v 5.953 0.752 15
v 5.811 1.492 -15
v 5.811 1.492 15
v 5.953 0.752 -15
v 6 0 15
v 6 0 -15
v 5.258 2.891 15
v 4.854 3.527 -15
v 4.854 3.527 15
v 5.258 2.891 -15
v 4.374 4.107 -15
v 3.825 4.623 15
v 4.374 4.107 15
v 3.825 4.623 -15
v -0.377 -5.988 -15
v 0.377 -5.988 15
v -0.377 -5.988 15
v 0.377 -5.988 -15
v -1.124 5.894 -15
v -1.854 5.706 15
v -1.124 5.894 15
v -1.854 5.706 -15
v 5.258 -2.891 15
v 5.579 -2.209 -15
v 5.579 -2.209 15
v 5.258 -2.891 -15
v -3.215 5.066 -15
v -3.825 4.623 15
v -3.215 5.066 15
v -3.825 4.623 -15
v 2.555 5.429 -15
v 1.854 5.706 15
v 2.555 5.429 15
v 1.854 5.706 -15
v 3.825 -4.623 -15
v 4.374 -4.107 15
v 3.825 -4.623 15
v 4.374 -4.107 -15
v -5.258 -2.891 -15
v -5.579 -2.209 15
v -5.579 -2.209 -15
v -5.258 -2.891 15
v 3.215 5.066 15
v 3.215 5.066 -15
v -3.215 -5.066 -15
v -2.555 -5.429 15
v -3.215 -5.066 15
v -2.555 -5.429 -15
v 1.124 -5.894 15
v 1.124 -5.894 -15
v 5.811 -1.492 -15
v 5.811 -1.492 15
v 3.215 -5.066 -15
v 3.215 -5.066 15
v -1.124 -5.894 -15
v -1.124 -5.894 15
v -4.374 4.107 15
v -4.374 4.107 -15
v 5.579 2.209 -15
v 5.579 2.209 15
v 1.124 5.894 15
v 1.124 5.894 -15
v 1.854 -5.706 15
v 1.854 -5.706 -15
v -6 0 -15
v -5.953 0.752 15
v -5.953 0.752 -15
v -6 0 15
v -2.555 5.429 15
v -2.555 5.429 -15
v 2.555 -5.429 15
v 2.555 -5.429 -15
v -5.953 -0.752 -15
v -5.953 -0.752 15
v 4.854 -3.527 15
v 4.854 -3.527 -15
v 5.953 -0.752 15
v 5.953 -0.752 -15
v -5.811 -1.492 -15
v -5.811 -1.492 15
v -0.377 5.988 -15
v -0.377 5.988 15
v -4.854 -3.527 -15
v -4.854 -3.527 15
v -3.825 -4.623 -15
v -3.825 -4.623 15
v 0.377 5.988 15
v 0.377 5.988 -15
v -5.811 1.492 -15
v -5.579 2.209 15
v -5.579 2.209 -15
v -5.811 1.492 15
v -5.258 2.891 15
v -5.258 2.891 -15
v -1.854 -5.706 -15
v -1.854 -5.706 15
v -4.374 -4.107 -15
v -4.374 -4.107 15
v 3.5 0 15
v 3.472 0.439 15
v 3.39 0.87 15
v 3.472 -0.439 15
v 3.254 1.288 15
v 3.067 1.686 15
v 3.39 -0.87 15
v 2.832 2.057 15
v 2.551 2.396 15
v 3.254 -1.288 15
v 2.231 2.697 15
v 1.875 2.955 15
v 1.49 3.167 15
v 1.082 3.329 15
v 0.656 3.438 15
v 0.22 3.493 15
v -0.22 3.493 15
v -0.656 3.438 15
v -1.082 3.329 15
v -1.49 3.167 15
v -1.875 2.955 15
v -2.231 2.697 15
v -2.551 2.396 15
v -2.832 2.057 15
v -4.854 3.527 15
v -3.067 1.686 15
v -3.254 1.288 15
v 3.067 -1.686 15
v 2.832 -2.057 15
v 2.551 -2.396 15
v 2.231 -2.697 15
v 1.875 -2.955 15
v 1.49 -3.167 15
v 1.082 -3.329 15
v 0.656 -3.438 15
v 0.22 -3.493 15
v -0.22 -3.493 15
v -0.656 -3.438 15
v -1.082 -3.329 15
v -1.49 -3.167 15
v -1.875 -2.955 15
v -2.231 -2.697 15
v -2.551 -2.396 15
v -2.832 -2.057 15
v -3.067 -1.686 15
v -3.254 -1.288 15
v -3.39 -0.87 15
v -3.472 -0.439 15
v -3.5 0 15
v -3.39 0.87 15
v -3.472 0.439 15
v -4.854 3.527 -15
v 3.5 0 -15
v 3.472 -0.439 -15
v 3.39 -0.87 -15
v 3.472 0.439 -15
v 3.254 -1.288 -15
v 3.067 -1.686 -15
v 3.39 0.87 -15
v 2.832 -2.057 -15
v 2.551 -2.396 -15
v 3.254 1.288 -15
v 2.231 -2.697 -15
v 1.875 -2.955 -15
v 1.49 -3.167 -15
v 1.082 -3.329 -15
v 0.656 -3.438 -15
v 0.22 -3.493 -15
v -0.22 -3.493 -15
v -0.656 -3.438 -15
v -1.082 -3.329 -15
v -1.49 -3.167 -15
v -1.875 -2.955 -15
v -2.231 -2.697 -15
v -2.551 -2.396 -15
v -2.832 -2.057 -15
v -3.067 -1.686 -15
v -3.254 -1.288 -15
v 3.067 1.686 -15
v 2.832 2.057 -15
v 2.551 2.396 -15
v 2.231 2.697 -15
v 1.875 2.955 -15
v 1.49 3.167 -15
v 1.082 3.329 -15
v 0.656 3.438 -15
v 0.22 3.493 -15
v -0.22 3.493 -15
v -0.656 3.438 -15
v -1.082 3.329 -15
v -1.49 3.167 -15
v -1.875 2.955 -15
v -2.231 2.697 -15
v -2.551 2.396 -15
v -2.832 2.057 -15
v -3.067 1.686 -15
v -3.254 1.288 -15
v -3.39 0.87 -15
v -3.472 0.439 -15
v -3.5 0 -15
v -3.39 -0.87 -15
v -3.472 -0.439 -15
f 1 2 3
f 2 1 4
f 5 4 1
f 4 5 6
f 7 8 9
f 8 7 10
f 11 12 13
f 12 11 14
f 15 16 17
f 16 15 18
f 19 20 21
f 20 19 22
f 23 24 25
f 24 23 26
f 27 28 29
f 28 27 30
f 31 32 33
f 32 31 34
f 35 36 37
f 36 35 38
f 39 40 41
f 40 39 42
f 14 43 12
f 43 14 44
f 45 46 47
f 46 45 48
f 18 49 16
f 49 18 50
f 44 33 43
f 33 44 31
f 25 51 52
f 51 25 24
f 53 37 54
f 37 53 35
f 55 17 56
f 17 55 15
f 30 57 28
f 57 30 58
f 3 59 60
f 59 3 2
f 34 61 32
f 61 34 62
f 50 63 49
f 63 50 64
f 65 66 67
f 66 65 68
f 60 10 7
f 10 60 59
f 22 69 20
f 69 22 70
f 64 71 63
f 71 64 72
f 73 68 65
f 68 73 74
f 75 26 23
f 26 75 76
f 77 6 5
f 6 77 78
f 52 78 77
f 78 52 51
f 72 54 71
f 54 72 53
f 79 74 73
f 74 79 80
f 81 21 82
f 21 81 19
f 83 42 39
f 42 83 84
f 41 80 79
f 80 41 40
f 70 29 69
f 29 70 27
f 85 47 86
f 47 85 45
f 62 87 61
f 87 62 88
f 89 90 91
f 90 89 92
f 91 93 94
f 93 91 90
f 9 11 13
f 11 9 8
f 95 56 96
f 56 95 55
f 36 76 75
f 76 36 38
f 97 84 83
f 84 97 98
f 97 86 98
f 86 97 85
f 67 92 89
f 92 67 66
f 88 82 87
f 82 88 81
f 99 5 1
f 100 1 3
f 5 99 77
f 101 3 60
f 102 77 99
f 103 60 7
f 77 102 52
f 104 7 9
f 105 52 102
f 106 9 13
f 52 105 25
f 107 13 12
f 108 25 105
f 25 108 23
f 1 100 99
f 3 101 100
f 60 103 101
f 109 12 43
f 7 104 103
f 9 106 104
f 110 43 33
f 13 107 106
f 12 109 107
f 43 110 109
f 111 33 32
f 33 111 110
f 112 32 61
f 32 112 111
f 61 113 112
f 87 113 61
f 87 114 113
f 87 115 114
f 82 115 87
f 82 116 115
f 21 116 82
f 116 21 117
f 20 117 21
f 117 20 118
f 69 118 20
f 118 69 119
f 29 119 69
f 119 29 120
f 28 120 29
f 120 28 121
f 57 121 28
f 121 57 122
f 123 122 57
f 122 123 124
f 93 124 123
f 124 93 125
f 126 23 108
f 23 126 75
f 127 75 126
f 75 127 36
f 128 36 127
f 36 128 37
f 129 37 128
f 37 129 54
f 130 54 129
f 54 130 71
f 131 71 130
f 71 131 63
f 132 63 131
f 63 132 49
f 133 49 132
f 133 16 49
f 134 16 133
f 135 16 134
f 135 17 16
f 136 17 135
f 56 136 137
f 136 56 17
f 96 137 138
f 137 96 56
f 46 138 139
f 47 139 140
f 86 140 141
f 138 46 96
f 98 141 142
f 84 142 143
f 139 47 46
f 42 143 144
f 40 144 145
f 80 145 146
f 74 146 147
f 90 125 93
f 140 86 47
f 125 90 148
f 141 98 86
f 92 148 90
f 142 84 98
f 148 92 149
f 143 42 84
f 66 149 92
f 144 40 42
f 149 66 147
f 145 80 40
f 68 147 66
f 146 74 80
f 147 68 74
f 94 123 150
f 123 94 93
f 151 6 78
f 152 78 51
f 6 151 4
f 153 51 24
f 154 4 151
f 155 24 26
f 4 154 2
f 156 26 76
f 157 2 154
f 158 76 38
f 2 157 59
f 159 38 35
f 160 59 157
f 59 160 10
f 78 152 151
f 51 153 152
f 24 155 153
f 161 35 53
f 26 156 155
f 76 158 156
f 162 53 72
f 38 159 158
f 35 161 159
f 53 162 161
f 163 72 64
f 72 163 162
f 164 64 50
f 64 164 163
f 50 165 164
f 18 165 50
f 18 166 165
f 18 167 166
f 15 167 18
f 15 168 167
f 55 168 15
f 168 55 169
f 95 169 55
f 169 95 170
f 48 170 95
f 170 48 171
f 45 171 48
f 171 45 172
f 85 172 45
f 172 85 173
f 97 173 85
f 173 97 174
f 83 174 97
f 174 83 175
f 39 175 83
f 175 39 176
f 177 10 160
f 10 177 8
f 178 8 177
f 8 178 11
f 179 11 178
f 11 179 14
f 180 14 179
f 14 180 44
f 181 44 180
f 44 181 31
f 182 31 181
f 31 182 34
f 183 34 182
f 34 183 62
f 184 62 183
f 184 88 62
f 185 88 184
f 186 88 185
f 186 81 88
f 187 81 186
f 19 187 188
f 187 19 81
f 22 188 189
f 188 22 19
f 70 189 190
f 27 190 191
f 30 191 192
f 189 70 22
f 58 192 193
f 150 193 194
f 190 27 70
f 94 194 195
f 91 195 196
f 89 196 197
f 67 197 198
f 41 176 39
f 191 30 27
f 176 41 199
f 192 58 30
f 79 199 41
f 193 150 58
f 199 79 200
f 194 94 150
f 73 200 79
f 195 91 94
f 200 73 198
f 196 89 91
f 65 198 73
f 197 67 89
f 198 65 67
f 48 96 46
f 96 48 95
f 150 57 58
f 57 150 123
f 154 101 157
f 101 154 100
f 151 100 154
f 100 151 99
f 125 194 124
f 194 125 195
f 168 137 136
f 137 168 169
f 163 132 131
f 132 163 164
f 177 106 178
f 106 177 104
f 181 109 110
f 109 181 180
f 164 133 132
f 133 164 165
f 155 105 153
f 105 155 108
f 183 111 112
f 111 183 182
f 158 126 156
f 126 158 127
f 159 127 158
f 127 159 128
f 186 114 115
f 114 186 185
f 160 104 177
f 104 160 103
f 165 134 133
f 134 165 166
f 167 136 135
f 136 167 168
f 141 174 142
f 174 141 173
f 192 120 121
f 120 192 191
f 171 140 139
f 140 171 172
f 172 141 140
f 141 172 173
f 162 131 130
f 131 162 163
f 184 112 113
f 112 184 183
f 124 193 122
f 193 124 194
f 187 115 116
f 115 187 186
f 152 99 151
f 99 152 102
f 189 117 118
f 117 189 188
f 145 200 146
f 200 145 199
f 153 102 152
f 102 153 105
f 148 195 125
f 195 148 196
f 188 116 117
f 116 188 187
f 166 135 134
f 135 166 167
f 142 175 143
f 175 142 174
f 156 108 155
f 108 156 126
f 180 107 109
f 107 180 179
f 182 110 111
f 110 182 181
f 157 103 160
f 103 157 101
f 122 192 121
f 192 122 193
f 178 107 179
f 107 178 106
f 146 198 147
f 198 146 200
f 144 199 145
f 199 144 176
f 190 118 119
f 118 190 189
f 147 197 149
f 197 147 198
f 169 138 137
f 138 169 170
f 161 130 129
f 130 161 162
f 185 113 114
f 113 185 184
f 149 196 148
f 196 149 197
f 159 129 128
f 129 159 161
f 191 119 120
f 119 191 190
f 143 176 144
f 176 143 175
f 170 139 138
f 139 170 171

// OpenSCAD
$fn = 50;


difference() {
	union() {
		translate(v = [0, 0, -15.0000000000]) {
			cylinder(h = 30, r = 6.0000000000);
		}
	}
	union() {
		translate(v = [0, 0, -100.0000000000]) {
			cylinder(h = 200, r = 3.5000000000);
		}
	}
}
